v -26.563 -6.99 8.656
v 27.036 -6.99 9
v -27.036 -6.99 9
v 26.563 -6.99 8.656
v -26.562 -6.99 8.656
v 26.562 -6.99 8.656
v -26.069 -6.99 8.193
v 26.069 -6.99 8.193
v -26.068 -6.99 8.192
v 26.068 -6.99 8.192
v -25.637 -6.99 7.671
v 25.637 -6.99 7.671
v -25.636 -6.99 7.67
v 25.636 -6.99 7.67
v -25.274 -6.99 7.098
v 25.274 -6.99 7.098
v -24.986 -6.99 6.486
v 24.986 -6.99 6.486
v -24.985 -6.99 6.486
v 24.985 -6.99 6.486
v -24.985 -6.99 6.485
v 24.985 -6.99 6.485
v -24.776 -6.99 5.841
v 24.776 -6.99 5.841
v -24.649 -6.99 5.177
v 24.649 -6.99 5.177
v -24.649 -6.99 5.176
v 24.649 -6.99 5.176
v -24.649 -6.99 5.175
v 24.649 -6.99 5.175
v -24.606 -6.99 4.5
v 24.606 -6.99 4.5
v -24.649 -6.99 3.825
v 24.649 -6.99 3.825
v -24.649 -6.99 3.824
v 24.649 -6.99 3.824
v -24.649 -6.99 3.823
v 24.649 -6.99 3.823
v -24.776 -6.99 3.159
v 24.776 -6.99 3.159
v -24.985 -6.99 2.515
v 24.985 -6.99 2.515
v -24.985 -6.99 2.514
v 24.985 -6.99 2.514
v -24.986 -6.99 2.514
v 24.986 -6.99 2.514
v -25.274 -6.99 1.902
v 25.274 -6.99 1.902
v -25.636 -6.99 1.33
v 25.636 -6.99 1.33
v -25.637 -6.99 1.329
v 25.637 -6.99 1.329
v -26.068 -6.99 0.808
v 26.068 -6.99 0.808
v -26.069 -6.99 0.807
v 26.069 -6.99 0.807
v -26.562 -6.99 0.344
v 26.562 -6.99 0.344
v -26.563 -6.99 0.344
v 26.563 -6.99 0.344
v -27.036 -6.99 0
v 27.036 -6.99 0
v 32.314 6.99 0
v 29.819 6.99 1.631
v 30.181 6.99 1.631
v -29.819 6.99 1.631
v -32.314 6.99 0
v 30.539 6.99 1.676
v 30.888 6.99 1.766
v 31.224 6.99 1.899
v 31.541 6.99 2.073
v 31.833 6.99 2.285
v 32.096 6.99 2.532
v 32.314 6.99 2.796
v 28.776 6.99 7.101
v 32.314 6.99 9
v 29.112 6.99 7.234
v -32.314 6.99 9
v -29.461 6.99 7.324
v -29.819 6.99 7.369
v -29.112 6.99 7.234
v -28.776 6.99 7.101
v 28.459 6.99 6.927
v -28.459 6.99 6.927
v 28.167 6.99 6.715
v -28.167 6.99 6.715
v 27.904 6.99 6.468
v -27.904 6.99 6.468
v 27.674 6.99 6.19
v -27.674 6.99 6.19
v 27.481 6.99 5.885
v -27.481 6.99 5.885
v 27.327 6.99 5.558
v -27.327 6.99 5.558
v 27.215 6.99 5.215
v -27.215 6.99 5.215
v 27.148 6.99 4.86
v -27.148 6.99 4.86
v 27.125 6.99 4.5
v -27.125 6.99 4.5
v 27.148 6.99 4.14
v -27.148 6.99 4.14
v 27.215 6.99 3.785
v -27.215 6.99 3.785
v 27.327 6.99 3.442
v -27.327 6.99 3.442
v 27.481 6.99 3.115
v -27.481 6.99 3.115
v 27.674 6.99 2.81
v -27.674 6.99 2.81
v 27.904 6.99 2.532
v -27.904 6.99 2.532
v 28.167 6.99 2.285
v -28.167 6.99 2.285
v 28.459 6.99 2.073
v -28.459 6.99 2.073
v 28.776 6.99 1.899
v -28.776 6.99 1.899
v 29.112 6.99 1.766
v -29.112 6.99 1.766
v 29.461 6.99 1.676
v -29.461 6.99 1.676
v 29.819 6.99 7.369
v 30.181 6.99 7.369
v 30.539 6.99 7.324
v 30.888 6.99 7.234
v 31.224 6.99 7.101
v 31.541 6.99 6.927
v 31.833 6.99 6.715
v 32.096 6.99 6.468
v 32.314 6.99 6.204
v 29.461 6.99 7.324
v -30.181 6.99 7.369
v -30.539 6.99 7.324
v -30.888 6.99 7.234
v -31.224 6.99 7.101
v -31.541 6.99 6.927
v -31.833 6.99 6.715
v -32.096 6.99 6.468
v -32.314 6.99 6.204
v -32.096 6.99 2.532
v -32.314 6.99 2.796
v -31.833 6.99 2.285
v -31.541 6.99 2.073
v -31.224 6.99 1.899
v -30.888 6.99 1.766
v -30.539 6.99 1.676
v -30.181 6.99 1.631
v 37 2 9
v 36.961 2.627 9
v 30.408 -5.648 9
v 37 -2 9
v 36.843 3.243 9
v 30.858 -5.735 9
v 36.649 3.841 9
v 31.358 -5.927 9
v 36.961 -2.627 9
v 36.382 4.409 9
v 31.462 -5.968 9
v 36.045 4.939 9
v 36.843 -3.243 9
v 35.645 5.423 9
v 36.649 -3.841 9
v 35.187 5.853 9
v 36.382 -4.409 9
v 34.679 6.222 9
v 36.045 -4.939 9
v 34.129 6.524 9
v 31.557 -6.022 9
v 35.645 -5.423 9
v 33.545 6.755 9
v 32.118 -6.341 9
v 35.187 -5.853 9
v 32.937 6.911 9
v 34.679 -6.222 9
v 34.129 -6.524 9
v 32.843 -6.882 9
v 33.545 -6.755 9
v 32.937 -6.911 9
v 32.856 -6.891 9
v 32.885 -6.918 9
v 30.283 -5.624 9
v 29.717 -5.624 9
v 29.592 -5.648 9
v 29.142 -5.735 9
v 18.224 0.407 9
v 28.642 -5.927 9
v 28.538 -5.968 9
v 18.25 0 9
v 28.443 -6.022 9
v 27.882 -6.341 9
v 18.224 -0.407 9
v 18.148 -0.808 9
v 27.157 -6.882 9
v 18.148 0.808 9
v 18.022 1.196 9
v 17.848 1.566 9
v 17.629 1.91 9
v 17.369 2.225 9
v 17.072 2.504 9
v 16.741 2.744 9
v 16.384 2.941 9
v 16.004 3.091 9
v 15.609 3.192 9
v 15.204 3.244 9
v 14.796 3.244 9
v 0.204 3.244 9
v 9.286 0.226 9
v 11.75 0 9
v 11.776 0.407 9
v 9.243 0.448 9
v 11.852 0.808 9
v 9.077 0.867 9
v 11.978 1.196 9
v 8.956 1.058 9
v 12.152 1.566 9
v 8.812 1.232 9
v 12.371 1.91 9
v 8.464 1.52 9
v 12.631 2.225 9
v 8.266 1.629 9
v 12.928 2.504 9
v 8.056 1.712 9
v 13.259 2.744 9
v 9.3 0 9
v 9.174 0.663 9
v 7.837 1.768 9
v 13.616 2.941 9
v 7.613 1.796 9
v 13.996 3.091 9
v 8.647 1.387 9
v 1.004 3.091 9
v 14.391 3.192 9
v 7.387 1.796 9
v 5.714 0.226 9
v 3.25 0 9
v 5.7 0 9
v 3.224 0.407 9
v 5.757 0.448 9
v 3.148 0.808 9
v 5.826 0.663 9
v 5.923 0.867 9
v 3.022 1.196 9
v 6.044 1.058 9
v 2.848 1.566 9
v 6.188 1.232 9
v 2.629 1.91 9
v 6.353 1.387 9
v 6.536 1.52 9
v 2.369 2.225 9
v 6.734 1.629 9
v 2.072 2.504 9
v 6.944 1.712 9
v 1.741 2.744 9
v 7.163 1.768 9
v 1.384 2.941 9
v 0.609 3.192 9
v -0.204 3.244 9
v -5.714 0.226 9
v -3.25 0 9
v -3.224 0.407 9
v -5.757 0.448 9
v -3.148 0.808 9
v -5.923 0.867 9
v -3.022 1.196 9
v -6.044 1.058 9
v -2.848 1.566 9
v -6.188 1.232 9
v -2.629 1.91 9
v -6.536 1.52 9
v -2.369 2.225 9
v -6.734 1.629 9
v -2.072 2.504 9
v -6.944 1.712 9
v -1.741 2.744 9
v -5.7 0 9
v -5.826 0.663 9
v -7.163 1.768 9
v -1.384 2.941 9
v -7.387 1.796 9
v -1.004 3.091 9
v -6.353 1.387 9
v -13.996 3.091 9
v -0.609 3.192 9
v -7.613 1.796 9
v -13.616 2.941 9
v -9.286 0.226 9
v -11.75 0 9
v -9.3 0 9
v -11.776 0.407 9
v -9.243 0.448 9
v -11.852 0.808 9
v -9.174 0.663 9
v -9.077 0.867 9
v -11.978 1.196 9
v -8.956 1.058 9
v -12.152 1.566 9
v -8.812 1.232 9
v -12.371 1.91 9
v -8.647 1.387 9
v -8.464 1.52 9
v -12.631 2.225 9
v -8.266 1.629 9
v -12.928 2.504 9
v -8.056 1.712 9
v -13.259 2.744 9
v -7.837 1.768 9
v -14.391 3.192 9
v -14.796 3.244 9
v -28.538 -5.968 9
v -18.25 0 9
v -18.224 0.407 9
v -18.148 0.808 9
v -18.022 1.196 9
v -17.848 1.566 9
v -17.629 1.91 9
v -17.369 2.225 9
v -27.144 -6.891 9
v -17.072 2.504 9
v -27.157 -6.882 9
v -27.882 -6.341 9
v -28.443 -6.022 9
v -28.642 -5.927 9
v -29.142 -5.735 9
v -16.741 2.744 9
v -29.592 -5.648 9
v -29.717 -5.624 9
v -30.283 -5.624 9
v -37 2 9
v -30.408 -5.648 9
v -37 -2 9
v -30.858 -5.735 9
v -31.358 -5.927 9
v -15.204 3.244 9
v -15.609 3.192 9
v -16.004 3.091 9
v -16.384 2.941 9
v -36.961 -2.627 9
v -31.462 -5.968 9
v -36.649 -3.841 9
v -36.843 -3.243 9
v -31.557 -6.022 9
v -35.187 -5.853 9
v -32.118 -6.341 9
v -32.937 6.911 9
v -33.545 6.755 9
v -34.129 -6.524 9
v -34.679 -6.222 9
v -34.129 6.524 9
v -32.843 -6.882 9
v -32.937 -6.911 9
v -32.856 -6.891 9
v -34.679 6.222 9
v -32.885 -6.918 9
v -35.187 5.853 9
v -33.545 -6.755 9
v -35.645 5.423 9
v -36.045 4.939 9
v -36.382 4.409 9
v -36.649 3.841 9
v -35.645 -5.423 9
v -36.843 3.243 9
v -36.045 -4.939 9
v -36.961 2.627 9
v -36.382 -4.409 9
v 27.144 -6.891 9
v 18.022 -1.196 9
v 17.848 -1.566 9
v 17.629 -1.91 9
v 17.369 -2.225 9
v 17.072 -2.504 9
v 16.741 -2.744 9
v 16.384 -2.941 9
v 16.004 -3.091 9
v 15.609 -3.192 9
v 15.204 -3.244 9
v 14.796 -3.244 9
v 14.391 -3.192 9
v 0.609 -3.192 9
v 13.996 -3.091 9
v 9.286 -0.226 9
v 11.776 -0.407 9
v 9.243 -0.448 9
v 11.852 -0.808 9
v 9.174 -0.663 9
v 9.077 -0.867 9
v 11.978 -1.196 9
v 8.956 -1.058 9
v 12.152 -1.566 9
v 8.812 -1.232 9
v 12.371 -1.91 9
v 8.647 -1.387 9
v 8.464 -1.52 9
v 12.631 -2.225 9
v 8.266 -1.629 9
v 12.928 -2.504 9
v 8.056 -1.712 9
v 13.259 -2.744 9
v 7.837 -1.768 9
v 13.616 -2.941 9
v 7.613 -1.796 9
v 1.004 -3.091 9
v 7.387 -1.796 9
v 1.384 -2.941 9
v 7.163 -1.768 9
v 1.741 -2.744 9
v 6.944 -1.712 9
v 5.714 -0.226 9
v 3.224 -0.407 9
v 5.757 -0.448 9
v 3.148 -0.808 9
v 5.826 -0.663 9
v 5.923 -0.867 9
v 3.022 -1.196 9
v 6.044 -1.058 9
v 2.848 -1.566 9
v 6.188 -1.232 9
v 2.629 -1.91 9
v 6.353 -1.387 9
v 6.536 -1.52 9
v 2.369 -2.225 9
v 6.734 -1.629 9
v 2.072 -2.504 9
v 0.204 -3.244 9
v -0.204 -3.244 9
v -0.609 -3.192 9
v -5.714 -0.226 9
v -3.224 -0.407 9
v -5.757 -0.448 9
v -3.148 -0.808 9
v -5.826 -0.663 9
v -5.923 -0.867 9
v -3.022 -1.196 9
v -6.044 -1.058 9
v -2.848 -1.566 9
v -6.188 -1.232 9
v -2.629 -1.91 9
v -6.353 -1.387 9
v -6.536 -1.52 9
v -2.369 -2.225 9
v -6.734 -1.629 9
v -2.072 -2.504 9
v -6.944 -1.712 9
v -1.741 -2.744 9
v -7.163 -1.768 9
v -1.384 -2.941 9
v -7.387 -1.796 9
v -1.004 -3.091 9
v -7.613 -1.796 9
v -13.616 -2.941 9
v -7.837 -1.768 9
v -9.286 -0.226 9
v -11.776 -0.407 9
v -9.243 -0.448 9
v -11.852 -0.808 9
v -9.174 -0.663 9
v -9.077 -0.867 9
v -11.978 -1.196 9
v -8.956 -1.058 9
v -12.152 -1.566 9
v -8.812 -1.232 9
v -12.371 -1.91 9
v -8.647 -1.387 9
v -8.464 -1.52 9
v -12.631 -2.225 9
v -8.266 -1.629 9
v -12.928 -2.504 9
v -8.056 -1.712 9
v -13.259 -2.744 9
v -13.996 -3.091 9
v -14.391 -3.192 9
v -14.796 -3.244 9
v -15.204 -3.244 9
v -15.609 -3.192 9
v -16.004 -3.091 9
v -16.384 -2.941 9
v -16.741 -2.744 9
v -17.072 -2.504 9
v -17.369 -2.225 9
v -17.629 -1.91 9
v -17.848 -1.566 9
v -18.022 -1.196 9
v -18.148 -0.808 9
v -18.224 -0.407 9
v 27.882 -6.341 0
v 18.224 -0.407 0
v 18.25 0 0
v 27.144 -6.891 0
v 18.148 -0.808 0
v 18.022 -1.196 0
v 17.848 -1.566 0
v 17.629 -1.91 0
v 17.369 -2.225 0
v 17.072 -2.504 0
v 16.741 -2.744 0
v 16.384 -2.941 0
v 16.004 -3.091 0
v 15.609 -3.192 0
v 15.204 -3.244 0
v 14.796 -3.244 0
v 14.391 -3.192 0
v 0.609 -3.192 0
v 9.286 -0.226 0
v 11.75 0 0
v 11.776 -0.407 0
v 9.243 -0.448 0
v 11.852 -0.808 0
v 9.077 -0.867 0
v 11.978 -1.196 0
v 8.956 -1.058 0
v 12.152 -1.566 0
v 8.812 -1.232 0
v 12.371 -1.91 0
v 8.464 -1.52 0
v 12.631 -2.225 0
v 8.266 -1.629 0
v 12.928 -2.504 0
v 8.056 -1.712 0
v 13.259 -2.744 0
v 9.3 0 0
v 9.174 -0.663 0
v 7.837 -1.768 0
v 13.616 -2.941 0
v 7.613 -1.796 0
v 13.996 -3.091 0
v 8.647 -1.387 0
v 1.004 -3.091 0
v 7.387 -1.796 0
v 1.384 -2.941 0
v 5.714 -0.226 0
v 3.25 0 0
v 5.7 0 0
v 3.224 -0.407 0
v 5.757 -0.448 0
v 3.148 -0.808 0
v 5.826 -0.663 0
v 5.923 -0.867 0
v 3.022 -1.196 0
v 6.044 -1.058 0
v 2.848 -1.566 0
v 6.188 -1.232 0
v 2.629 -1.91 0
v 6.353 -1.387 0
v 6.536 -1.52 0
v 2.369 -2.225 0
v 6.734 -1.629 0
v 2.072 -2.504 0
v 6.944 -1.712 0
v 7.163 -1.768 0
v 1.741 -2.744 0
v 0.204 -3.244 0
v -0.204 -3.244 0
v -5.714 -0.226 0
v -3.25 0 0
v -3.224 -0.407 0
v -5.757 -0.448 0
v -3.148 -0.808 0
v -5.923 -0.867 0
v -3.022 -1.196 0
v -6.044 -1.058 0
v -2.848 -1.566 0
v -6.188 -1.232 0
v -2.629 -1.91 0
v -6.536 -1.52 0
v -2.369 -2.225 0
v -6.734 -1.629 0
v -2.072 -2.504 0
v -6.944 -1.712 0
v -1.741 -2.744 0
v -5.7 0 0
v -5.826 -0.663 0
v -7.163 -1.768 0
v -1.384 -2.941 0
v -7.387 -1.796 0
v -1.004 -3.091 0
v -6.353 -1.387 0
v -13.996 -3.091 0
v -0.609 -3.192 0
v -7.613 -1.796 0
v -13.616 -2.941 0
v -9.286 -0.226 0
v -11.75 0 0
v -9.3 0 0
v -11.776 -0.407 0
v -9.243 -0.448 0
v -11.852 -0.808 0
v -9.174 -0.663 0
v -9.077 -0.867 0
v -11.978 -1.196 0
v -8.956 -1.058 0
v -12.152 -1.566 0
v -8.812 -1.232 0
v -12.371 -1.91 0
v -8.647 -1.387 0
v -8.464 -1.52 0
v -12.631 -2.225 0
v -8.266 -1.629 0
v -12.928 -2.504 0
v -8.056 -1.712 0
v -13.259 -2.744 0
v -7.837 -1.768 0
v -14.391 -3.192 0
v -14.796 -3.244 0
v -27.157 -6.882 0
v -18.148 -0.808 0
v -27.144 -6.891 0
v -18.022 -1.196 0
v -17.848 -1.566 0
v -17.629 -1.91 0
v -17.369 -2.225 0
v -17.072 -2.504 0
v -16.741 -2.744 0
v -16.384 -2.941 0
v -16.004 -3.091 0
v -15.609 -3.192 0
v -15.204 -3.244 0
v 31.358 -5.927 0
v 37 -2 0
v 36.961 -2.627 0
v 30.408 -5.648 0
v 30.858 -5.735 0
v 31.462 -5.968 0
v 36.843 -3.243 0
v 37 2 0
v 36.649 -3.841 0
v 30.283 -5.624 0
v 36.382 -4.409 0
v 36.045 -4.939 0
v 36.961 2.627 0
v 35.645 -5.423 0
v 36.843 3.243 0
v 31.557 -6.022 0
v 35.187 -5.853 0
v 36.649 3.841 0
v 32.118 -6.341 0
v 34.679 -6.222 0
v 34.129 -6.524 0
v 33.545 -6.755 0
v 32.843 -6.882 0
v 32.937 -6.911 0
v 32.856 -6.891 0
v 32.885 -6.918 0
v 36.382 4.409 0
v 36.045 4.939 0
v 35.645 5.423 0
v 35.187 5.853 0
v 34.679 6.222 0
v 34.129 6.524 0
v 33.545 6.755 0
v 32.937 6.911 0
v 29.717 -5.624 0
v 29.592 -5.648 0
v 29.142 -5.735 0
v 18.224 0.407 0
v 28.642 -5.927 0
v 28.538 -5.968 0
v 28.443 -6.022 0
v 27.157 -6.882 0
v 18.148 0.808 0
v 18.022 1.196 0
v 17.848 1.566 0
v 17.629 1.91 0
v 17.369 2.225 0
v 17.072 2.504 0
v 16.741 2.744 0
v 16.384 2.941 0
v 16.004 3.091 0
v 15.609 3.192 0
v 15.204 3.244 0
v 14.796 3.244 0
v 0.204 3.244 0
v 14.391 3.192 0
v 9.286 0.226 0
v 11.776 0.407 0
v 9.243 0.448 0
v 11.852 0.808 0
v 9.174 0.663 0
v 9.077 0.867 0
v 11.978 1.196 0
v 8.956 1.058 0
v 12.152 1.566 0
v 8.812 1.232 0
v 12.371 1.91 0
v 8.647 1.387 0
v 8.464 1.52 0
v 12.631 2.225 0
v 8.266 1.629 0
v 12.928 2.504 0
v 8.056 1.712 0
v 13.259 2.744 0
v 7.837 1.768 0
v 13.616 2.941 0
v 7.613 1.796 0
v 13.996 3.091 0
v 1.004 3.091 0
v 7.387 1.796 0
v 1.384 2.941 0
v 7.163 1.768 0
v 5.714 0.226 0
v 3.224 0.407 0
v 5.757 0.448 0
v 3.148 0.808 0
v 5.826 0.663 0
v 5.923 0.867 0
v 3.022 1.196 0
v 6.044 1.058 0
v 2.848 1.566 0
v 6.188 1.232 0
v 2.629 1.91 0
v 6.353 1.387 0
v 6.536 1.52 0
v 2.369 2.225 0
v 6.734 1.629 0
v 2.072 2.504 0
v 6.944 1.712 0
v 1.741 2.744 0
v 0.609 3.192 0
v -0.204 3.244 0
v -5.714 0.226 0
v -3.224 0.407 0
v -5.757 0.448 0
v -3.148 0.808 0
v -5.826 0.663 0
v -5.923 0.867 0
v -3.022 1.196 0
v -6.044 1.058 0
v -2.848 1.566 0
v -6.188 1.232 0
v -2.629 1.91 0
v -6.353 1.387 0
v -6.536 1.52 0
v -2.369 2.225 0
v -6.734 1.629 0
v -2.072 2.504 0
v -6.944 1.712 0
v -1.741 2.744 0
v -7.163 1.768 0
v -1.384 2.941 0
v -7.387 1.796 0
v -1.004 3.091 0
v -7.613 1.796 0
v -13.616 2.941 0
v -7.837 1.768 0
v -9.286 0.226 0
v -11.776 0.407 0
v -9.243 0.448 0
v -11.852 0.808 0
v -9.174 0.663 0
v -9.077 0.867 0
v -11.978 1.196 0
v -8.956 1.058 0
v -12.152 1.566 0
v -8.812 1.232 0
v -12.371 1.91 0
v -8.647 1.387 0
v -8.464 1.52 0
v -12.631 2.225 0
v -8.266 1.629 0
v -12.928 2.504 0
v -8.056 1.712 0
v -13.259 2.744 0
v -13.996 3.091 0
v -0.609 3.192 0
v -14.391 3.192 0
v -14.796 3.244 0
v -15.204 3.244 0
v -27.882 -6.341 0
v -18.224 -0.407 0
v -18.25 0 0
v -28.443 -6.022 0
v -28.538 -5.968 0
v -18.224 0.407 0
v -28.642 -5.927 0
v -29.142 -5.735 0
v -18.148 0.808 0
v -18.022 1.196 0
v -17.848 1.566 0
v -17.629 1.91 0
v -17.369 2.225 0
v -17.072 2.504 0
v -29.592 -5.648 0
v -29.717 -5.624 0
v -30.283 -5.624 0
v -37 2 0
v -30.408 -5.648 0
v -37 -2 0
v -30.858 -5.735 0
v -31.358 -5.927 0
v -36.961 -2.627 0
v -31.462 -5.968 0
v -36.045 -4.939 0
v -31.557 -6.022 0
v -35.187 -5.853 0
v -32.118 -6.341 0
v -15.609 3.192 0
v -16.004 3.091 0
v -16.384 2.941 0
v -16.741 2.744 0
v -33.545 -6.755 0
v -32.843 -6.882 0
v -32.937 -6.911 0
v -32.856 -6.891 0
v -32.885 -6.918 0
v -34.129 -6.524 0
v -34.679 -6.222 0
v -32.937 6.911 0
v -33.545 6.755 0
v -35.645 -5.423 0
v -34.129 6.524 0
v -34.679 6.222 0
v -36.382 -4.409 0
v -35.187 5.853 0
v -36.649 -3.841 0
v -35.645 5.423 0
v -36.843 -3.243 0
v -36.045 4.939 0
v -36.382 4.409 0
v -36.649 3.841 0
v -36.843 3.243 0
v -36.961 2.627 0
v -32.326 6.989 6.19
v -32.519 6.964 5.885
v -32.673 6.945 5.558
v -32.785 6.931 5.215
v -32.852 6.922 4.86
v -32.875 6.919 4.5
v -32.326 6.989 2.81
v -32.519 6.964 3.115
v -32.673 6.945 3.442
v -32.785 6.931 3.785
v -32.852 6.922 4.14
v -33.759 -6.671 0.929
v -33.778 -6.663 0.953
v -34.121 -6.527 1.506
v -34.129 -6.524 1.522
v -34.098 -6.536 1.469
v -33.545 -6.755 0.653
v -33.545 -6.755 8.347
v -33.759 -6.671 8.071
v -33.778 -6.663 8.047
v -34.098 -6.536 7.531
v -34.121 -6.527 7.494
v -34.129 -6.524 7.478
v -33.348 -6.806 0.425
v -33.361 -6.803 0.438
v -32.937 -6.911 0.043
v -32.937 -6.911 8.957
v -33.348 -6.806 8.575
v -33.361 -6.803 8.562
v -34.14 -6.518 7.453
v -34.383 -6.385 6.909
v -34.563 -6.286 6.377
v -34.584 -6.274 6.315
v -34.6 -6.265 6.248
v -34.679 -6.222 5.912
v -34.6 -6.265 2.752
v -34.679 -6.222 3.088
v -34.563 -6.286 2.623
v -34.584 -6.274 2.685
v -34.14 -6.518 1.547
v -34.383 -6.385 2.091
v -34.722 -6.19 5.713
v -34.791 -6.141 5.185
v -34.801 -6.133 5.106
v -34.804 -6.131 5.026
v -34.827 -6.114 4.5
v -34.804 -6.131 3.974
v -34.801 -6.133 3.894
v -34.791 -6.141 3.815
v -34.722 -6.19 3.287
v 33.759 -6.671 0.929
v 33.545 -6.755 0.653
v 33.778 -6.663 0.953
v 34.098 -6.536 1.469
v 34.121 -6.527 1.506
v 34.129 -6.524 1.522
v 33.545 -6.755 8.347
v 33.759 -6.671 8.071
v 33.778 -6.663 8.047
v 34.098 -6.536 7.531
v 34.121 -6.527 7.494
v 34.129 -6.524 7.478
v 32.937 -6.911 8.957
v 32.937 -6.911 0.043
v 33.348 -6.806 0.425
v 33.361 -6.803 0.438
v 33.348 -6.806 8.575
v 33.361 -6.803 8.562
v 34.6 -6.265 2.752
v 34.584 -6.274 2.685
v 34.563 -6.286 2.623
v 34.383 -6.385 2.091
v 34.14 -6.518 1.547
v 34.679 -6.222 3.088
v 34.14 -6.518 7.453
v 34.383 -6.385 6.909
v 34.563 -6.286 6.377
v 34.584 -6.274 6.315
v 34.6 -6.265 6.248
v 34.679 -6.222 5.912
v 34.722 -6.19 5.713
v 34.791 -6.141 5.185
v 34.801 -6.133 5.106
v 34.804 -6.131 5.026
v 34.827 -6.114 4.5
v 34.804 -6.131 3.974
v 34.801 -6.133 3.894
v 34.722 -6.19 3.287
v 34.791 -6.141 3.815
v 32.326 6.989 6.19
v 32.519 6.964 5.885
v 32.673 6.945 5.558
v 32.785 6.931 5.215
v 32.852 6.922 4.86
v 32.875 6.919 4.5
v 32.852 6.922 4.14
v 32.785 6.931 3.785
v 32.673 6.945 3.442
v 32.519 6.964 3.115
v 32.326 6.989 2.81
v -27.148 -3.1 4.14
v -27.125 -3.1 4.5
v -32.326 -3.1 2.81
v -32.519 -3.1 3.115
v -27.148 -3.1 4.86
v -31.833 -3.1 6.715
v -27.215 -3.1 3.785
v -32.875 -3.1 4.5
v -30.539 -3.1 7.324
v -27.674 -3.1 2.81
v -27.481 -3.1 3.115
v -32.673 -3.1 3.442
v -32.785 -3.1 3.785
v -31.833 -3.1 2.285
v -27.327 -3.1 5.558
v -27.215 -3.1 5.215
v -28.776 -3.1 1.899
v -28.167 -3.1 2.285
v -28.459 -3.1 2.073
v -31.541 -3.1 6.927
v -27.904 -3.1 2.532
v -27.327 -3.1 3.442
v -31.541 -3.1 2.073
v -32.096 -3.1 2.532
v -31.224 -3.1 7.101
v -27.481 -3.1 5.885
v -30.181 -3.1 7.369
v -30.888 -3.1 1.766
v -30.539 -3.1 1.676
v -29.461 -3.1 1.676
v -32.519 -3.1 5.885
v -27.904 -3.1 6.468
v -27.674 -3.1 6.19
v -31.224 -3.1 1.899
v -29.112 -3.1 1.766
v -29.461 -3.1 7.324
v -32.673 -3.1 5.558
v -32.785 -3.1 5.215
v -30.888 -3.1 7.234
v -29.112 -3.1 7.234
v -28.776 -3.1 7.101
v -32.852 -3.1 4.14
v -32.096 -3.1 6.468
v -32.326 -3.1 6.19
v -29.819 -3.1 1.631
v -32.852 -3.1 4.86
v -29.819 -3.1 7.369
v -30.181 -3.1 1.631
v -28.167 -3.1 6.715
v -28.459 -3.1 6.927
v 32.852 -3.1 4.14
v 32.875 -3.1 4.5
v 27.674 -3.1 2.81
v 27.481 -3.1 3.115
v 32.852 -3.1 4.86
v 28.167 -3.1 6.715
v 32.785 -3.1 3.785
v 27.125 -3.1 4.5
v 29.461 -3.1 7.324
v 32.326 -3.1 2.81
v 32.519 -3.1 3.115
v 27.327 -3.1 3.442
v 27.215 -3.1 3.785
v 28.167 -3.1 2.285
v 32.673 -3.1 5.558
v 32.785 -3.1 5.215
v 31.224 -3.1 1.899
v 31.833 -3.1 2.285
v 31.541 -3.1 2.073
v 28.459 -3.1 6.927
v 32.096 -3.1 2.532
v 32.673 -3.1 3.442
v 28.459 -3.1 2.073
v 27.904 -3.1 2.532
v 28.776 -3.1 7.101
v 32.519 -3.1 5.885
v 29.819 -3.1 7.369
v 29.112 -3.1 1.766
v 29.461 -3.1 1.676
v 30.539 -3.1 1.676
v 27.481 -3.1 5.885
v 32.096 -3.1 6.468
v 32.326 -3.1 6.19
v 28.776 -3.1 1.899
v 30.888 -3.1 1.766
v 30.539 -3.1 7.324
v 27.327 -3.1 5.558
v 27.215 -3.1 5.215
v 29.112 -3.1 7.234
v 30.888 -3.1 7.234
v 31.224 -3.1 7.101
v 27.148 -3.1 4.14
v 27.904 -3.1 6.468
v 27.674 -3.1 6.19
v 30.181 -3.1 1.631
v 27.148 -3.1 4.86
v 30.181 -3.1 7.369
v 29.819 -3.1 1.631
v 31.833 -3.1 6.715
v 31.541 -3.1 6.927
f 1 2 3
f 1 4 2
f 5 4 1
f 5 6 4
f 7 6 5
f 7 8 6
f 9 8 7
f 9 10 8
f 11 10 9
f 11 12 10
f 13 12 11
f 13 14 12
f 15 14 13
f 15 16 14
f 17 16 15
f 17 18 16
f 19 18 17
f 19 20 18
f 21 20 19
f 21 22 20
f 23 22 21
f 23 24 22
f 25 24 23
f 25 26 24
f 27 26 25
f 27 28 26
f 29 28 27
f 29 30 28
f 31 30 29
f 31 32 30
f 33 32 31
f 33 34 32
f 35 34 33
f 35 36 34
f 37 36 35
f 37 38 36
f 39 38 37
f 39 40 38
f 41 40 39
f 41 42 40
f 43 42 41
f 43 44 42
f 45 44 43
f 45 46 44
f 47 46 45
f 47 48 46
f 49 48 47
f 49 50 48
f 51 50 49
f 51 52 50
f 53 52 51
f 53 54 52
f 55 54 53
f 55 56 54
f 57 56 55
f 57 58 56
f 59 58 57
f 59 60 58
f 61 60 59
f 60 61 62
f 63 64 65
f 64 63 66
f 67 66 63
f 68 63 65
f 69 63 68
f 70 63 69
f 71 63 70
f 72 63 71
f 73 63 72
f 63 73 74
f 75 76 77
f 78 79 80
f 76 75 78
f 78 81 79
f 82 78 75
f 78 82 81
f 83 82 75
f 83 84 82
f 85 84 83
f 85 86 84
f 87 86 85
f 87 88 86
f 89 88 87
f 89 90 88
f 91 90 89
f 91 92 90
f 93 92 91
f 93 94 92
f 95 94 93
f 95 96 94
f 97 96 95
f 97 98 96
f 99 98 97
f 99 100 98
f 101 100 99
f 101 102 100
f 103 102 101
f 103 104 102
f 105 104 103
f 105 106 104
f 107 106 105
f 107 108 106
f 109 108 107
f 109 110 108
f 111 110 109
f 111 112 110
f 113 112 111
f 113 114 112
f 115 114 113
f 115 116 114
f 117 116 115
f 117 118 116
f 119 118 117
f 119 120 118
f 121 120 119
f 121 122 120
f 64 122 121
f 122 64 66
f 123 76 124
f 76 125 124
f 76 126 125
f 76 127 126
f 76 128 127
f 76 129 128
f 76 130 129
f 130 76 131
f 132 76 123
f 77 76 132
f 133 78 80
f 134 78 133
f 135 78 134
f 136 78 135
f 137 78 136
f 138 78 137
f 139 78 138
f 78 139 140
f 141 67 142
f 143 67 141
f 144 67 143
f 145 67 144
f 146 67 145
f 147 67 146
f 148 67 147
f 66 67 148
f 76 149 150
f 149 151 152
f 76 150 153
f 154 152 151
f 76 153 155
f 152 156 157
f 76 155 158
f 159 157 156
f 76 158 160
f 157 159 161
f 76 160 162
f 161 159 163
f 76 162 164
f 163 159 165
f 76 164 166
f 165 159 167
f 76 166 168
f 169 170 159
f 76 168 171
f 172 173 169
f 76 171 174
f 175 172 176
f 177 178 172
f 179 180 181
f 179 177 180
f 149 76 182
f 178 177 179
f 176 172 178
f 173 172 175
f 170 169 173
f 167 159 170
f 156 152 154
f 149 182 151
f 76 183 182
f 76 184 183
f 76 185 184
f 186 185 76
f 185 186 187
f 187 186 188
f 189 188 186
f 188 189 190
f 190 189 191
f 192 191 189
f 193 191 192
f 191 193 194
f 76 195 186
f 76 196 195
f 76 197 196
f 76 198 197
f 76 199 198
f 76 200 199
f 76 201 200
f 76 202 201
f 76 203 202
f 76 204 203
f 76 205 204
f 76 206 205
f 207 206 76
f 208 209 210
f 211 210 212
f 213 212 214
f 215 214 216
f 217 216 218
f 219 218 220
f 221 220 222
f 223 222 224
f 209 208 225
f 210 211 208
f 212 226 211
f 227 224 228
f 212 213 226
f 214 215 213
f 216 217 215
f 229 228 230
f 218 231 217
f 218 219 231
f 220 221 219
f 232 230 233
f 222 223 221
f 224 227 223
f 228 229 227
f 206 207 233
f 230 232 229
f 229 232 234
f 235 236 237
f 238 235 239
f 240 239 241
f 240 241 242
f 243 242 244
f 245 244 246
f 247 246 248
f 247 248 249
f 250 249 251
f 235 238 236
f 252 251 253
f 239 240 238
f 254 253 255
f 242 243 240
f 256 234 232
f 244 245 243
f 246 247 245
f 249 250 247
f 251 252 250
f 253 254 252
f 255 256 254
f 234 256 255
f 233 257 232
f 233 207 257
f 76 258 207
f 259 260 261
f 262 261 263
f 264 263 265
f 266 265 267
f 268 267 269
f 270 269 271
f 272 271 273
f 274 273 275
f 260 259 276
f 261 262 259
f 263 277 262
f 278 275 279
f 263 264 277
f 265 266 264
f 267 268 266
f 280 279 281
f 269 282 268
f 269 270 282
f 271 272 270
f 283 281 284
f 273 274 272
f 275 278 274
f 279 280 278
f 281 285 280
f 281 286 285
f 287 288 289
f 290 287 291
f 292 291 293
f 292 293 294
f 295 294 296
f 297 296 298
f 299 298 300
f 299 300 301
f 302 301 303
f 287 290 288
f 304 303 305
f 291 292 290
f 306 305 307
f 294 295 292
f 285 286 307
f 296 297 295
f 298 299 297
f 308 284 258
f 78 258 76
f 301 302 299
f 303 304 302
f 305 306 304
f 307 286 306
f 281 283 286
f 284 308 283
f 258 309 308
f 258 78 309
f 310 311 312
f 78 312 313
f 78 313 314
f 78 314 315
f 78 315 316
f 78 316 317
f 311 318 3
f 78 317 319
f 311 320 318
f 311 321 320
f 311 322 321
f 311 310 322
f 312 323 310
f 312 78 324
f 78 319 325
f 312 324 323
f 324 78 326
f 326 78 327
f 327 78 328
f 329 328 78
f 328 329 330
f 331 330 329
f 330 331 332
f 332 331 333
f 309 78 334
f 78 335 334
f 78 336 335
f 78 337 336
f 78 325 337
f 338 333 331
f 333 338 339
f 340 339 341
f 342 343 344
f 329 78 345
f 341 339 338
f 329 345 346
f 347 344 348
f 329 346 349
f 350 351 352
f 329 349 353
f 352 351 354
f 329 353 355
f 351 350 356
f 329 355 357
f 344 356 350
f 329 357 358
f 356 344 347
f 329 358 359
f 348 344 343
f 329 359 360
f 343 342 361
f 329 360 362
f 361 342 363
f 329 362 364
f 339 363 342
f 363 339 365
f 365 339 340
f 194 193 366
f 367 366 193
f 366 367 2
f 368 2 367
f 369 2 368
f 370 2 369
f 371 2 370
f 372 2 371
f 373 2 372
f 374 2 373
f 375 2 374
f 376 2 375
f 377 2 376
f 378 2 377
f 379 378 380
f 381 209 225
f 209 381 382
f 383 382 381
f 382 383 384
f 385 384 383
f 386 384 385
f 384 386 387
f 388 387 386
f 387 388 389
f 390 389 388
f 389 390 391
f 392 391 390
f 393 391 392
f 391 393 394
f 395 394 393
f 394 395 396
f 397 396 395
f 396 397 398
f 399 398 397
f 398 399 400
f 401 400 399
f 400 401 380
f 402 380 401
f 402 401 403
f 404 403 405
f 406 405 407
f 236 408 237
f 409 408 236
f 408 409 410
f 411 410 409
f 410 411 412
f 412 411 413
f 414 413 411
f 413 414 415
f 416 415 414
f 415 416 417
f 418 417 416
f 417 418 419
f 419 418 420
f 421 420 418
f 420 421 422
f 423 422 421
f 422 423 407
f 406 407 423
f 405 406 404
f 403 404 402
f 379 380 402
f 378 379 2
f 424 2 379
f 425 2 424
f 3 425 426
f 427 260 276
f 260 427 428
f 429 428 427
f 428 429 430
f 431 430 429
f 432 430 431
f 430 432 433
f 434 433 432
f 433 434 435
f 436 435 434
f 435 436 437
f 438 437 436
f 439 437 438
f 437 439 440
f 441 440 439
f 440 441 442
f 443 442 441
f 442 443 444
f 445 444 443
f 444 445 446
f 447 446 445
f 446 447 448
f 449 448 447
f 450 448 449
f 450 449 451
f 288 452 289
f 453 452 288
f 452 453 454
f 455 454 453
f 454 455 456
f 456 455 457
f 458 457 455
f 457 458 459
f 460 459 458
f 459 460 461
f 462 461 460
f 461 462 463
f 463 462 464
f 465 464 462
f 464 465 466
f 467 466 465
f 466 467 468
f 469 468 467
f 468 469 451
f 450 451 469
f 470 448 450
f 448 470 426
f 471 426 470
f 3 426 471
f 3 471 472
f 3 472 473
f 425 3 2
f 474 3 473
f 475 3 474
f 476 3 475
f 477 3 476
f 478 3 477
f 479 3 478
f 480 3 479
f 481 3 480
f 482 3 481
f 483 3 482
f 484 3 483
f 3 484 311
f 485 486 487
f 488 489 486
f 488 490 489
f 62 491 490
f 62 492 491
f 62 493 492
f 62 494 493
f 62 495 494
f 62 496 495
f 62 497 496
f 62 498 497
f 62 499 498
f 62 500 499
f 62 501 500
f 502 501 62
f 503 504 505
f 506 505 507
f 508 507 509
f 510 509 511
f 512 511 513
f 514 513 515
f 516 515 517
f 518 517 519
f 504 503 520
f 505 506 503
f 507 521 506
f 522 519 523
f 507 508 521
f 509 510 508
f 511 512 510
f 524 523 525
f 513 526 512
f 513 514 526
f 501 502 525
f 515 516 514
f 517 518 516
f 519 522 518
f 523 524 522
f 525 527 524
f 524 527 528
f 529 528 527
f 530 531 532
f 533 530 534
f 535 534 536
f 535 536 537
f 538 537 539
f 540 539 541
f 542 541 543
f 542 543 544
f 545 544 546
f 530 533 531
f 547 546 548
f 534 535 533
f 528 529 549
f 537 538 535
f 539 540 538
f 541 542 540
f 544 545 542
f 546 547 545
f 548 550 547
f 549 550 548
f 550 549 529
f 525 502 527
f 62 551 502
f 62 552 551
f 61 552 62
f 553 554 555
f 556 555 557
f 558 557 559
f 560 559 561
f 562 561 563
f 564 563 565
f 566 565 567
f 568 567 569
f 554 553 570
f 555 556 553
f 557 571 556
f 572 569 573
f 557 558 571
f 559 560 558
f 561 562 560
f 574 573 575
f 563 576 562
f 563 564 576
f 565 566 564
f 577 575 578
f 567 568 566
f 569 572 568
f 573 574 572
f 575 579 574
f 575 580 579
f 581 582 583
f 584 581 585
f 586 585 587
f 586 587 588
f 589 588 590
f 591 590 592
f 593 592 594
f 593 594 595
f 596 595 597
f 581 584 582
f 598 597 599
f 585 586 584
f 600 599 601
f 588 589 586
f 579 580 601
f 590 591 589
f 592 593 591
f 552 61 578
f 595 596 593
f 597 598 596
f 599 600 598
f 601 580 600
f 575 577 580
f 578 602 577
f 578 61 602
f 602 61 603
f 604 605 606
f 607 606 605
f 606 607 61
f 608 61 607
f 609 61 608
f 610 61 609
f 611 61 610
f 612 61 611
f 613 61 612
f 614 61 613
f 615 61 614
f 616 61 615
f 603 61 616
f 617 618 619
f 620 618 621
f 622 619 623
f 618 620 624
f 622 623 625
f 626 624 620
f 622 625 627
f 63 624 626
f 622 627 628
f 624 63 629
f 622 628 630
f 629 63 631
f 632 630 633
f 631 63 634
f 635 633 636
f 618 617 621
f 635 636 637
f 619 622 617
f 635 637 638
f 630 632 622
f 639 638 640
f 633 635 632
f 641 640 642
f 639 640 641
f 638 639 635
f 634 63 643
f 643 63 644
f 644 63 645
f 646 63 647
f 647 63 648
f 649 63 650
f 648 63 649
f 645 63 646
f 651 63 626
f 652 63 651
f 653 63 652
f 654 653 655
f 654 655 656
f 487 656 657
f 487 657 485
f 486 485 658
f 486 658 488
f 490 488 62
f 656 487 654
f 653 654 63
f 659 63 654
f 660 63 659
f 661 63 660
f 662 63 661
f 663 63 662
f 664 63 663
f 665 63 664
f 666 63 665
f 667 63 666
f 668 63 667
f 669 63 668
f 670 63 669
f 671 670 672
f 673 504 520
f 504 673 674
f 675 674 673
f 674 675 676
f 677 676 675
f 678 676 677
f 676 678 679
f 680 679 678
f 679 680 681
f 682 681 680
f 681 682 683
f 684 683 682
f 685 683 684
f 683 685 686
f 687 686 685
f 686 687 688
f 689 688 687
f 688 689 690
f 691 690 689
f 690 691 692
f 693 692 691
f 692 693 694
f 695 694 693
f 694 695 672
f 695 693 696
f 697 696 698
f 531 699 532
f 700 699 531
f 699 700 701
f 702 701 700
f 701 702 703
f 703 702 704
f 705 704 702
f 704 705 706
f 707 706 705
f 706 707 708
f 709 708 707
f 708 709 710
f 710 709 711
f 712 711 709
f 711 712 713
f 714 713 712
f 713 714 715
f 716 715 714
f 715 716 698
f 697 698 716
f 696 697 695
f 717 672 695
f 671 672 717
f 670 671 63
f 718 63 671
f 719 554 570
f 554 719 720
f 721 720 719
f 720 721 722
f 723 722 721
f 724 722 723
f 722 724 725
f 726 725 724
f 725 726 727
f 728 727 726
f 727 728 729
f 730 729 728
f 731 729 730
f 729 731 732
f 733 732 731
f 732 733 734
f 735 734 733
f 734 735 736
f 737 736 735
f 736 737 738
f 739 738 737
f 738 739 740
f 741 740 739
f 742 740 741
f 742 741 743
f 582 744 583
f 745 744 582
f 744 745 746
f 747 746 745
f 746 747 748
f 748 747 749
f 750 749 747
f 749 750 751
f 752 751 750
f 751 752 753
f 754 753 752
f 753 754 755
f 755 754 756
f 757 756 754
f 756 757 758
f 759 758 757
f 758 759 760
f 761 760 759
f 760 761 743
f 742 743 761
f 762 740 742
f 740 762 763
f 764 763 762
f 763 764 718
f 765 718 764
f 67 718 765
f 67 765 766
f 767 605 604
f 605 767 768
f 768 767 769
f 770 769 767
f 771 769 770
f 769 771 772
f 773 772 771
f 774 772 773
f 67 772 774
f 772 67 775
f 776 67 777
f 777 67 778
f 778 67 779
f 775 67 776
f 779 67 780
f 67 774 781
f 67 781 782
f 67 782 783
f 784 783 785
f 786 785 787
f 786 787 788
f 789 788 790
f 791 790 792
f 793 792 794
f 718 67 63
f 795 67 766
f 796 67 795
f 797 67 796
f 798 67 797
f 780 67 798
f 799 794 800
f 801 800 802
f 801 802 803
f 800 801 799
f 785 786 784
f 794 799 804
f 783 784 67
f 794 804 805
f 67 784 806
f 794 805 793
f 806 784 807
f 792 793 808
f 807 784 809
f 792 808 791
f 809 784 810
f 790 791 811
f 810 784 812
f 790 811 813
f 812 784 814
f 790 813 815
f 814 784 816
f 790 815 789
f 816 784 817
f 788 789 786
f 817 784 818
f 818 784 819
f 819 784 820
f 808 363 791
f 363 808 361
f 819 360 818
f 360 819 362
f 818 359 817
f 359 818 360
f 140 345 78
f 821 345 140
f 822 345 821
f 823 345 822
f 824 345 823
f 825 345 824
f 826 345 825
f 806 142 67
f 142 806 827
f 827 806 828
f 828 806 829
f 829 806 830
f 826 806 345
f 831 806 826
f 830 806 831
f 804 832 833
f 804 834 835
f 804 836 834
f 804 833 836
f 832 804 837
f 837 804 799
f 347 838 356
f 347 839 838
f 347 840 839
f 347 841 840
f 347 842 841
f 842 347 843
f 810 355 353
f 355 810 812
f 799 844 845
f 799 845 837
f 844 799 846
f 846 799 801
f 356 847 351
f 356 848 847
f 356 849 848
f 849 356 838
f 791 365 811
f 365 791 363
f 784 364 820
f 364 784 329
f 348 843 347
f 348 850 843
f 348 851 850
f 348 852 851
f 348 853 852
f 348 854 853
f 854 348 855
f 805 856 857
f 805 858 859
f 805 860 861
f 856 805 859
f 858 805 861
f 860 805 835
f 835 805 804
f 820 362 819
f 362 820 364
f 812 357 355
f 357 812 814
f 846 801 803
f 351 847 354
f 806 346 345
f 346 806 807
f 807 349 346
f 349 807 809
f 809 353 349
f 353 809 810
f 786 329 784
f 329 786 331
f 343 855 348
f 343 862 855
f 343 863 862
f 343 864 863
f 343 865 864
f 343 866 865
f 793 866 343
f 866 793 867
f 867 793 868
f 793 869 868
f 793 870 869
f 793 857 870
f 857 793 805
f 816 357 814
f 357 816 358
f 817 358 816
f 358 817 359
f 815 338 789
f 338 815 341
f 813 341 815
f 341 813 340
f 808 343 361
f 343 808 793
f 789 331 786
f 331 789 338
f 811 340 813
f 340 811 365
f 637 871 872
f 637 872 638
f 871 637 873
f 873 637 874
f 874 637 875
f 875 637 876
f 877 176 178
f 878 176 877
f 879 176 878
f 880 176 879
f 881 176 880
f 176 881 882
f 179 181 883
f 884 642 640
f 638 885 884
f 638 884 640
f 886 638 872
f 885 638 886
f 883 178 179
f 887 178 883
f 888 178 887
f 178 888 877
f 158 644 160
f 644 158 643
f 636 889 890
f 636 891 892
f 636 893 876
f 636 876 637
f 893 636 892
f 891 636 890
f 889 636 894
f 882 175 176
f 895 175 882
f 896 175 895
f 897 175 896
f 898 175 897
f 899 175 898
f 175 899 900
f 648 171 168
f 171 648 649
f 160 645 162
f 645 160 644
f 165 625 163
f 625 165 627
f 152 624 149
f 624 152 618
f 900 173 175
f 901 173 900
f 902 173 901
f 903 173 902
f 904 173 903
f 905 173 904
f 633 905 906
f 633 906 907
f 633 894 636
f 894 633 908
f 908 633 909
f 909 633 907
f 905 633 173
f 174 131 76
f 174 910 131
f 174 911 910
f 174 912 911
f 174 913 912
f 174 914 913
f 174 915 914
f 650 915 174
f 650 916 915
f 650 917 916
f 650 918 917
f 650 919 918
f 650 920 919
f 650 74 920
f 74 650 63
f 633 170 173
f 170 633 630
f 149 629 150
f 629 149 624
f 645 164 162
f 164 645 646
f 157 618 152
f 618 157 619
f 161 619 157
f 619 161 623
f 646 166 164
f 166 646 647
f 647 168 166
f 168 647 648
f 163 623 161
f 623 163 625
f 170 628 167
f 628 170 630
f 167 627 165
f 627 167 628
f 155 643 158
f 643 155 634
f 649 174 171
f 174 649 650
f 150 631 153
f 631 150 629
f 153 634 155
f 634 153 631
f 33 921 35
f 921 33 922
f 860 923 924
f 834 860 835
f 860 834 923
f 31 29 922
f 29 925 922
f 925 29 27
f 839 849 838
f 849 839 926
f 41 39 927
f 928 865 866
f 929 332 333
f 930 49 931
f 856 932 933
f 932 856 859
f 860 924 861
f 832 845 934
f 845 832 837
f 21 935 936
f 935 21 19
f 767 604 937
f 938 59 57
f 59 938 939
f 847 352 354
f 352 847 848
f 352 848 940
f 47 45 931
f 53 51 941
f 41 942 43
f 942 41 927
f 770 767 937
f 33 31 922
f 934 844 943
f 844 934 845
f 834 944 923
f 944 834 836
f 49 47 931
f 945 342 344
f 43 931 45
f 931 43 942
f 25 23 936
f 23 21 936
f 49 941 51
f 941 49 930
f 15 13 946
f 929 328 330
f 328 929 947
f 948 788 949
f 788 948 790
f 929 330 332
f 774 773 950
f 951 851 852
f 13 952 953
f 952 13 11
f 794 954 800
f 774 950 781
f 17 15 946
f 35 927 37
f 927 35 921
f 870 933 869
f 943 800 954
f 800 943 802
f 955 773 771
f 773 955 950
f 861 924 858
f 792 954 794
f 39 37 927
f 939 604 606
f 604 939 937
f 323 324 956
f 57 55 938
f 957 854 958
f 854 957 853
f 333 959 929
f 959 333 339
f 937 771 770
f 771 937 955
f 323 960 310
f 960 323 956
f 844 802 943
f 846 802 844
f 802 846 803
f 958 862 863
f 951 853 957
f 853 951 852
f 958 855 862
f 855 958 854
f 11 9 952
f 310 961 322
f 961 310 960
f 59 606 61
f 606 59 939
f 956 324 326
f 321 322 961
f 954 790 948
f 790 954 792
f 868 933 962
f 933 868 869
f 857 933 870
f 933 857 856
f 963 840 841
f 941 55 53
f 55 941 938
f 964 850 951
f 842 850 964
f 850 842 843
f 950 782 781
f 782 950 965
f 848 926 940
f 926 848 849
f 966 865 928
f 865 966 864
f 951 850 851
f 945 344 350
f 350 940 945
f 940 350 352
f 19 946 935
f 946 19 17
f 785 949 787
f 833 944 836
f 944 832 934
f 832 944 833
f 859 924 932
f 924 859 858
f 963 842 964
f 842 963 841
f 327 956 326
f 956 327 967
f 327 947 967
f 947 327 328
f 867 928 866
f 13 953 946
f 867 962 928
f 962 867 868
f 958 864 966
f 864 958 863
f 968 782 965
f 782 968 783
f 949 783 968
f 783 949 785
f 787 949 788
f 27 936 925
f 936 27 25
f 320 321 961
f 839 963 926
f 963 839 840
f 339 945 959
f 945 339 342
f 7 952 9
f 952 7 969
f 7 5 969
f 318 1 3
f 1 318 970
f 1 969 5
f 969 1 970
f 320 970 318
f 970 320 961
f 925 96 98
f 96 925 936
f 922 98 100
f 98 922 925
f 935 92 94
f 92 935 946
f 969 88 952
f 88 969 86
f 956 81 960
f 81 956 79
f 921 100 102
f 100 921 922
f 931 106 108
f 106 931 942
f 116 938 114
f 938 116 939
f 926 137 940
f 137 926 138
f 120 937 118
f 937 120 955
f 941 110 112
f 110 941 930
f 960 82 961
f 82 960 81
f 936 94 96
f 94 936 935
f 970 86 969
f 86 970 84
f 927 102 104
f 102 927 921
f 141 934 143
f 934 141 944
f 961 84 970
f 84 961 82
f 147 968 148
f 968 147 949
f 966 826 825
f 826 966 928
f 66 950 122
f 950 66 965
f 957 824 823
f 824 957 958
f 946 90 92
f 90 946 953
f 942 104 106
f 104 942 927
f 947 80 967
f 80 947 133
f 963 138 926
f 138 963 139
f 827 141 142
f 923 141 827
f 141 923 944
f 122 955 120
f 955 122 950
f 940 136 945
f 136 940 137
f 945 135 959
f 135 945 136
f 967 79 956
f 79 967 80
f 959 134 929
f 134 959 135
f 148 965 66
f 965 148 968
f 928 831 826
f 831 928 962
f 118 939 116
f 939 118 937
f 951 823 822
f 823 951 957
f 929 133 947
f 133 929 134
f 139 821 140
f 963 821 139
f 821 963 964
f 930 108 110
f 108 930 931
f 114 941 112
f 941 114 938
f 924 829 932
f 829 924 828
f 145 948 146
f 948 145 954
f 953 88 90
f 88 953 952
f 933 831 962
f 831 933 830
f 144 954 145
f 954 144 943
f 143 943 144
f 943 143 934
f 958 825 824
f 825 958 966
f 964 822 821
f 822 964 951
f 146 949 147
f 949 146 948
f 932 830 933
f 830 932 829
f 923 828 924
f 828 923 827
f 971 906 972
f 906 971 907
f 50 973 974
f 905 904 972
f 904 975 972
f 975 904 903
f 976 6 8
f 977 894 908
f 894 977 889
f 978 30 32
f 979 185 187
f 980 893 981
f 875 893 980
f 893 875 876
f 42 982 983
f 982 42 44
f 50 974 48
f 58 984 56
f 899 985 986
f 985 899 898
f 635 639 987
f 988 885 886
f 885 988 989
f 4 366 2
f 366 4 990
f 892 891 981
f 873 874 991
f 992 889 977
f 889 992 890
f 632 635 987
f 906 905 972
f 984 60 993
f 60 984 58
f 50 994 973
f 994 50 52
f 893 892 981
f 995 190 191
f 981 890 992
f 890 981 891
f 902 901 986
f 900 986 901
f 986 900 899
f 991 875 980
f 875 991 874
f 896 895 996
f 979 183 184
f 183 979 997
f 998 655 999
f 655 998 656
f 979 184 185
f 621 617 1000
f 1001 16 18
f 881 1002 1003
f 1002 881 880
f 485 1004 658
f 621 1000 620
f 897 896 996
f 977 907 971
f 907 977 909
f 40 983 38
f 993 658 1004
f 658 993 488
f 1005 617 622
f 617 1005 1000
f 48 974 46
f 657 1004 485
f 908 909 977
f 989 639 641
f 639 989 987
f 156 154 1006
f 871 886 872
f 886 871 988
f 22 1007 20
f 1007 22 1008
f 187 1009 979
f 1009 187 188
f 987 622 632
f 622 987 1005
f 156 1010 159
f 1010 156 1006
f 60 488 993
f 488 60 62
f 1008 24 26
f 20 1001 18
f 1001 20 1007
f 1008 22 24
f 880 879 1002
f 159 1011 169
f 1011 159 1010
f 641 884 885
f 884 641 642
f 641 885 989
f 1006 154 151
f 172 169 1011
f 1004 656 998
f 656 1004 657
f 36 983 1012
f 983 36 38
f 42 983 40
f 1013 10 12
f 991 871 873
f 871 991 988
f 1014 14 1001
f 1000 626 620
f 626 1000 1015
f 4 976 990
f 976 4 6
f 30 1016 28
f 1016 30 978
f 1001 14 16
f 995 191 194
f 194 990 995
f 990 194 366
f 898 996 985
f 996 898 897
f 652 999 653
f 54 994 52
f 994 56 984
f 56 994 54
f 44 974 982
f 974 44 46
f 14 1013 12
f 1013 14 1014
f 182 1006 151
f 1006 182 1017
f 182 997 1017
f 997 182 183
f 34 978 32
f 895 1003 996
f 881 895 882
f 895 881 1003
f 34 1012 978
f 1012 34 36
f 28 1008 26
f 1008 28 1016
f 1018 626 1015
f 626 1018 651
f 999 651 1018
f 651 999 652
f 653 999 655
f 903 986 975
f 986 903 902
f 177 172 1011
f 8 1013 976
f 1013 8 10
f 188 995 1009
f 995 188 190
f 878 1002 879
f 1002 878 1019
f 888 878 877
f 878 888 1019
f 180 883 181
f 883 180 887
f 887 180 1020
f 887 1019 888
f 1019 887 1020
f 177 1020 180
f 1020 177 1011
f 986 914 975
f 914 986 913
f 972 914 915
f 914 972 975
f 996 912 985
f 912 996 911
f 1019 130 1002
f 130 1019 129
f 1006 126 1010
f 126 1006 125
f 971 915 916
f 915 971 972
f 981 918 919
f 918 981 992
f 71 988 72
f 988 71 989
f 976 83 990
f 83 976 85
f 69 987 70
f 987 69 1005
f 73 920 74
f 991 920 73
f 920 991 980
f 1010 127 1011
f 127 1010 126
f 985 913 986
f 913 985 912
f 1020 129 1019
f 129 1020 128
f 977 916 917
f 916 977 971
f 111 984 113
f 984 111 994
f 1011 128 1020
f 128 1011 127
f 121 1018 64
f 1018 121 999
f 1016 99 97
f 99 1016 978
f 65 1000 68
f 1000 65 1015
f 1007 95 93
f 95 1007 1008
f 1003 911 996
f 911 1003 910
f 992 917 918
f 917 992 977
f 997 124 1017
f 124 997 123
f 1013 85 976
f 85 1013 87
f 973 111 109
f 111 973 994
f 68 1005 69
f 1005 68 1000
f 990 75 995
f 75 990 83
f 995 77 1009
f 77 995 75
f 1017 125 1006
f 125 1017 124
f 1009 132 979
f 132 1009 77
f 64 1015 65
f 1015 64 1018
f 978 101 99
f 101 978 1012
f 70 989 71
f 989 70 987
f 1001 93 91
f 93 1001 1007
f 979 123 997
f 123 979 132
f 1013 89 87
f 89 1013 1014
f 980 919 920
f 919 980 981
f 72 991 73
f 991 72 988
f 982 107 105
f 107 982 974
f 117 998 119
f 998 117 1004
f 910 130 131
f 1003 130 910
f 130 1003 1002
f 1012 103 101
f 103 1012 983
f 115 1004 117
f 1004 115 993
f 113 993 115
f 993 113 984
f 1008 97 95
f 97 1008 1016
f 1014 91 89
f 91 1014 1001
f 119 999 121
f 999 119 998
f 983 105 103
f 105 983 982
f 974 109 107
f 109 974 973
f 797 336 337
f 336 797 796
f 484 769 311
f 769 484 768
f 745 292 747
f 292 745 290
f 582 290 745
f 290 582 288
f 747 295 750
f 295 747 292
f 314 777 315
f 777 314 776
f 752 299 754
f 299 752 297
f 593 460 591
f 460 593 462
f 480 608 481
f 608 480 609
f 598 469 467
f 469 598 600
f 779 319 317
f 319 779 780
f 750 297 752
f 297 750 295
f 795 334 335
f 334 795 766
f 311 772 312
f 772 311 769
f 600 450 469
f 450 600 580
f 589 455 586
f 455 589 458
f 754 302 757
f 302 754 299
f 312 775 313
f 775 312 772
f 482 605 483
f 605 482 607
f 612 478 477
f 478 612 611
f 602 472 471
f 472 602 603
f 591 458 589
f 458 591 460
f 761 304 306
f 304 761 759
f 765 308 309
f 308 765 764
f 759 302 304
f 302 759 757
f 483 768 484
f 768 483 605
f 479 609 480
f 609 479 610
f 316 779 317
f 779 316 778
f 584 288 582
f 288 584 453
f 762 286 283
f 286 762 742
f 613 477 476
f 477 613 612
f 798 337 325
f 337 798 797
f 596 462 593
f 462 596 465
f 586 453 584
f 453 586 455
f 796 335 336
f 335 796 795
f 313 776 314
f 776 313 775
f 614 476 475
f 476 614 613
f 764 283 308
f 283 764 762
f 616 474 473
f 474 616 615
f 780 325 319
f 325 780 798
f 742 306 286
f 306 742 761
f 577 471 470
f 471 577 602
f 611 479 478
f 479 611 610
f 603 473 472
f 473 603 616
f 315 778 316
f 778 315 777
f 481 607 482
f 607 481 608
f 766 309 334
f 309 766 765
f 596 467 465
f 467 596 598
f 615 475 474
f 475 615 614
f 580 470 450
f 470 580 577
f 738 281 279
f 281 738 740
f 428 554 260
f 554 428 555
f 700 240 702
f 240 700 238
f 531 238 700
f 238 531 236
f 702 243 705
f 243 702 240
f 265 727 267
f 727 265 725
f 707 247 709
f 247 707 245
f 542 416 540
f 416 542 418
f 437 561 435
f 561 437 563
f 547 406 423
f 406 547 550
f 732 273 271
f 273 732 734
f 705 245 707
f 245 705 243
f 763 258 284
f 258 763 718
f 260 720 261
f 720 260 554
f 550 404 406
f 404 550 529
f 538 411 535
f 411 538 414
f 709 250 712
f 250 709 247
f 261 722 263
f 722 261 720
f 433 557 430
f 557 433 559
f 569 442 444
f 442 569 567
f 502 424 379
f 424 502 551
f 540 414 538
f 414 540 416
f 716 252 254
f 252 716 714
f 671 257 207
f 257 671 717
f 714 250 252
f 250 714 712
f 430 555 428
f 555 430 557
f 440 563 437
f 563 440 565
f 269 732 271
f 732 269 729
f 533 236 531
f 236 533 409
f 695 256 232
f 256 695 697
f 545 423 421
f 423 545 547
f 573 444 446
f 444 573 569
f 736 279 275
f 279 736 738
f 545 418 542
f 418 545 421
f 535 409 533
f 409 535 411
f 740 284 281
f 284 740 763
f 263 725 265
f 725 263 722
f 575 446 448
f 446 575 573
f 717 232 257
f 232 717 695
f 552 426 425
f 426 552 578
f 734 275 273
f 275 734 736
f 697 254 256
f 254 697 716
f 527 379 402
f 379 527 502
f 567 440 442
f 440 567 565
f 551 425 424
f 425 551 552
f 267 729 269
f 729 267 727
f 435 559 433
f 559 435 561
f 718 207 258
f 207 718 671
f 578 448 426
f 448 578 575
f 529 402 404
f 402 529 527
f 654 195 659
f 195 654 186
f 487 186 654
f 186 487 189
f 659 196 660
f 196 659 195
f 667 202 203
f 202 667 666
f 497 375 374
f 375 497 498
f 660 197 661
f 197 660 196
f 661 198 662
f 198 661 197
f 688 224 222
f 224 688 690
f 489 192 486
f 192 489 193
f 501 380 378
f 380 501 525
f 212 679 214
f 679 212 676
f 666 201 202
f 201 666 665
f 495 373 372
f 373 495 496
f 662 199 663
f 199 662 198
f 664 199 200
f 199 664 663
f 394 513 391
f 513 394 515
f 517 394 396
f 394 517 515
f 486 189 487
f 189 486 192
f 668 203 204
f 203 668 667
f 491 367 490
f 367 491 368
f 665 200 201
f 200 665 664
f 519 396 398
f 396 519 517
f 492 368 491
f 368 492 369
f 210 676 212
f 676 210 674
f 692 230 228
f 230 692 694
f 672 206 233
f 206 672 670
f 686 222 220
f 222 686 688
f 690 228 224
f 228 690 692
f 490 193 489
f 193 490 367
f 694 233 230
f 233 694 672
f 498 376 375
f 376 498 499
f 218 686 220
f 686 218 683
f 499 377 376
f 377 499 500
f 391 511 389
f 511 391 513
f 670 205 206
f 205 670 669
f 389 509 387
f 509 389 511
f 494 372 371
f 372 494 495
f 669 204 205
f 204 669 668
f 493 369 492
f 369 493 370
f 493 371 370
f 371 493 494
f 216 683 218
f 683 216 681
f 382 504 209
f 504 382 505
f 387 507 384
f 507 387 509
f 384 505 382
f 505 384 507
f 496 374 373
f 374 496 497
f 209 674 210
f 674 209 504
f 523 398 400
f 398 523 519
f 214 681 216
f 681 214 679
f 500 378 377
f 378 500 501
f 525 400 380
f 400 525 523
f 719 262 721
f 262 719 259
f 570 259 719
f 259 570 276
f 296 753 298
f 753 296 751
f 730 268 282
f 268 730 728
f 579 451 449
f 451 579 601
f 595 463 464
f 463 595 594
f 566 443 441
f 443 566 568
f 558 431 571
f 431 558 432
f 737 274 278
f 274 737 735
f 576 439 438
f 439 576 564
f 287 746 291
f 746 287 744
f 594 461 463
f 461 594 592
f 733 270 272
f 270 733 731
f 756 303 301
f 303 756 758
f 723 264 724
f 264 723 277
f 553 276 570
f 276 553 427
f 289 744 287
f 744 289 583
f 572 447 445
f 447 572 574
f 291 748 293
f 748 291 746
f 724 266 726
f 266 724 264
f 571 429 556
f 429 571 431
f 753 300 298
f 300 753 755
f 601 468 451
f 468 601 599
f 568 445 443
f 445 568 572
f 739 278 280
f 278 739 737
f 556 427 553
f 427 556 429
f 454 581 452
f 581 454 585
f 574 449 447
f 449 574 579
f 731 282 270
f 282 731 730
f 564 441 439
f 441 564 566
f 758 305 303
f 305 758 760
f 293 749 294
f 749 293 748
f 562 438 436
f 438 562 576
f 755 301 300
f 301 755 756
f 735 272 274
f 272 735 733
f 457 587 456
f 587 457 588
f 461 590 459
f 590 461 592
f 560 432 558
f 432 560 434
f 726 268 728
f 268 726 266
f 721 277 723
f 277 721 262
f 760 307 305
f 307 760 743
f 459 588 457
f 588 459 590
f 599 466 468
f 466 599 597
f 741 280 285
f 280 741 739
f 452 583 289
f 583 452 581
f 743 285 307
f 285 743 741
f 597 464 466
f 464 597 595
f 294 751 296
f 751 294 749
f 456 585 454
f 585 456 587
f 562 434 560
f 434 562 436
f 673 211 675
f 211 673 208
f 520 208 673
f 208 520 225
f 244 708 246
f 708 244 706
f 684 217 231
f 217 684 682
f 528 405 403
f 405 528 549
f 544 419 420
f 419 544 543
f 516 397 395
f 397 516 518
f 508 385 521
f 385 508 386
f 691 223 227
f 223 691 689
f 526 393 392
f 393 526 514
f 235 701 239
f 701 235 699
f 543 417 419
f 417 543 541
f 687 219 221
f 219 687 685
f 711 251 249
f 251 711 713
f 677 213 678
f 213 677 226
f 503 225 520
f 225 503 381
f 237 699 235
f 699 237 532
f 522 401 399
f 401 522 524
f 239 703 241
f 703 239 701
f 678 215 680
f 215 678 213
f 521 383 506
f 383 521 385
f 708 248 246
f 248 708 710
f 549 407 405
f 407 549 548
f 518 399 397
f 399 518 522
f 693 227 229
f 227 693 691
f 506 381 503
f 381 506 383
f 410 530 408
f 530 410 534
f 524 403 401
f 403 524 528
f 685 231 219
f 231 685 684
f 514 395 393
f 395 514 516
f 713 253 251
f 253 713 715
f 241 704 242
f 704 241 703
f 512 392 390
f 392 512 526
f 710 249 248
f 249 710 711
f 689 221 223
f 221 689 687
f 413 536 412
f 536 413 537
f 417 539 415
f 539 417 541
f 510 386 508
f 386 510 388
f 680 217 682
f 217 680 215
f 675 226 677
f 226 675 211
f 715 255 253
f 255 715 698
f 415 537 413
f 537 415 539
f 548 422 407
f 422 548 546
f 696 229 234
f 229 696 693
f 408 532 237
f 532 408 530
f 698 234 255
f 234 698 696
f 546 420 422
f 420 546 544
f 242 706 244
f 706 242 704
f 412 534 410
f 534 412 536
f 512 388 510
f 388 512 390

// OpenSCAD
$fn = 50;


difference() {
	union() {
		hull() {
			translate(v = [-17.0000000000, 2.0000000000, 0]) {
				cylinder(h = 9, r = 5);
			}
			translate(v = [17.0000000000, 2.0000000000, 0]) {
				cylinder(h = 9, r = 5);
			}
			translate(v = [-17.0000000000, -2.0000000000, 0]) {
				cylinder(h = 9, r = 5);
			}
			translate(v = [17.0000000000, -2.0000000000, 0]) {
				cylinder(h = 9, r = 5);
			}
		}
		translate(v = [-22.5000000000, 0.0000000000, 0]) {
			hull() {
				translate(v = [-9.5000000000, 2.0000000000, 0]) {
					cylinder(h = 9, r = 5);
				}
				translate(v = [9.5000000000, 2.0000000000, 0]) {
					cylinder(h = 9, r = 5);
				}
				translate(v = [-9.5000000000, -2.0000000000, 0]) {
					cylinder(h = 9, r = 5);
				}
				translate(v = [9.5000000000, -2.0000000000, 0]) {
					cylinder(h = 9, r = 5);
				}
			}
		}
		translate(v = [-22.5000000000, 0.0000000000, 0]) {
			hull() {
				translate(v = [-9.5000000000, 2.0000000000, 0]) {
					cylinder(h = 9, r = 5);
				}
				translate(v = [9.5000000000, 2.0000000000, 0]) {
					cylinder(h = 9, r = 5);
				}
				translate(v = [-9.5000000000, -2.0000000000, 0]) {
					cylinder(h = 9, r = 5);
				}
				translate(v = [9.5000000000, -2.0000000000, 0]) {
					cylinder(h = 9, r = 5);
				}
			}
		}
		translate(v = [22.5000000000, 0.0000000000, 0]) {
			hull() {
				translate(v = [-9.5000000000, 2.0000000000, 0]) {
					cylinder(h = 9, r = 5);
				}
				translate(v = [9.5000000000, 2.0000000000, 0]) {
					cylinder(h = 9, r = 5);
				}
				translate(v = [-9.5000000000, -2.0000000000, 0]) {
					cylinder(h = 9, r = 5);
				}
				translate(v = [9.5000000000, -2.0000000000, 0]) {
					cylinder(h = 9, r = 5);
				}
			}
		}
		translate(v = [22.5000000000, 0.0000000000, 0]) {
			hull() {
				translate(v = [-9.5000000000, 2.0000000000, 0]) {
					cylinder(h = 9, r = 5);
				}
				translate(v = [9.5000000000, 2.0000000000, 0]) {
					cylinder(h = 9, r = 5);
				}
				translate(v = [-9.5000000000, -2.0000000000, 0]) {
					cylinder(h = 9, r = 5);
				}
				translate(v = [9.5000000000, -2.0000000000, 0]) {
					cylinder(h = 9, r = 5);
				}
			}
		}
	}
	union() {
		translate(v = [-30.0000000000, -7.0000000000, 4.5000000000]) {
			rotate(a = [90, 0, 0]) {
				difference() {
					union() {
						#translate(v = [0, 0, -14.0000000000]) {
							cylinder(h = 14, r = 2.6000000000);
						}
						#translate(v = [0, 0, -3.9000000000]) {
							cylinder(h = 3.9000000000, r1 = 2.8750000000, r2 = 5.4000000000);
						}
						#translate(v = [0, 0, -14.0000000000]) {
							cylinder(h = 14, r = 2.8750000000);
						}
						#translate(v = [0, 0, -14.0000000000]) {
							cylinder(h = 14, r = 2.6000000000);
						}
					}
					union();
				}
			}
		}
		translate(v = [30.0000000000, -7.0000000000, 4.5000000000]) {
			rotate(a = [90, 0, 0]) {
				difference() {
					union() {
						#translate(v = [0, 0, -14.0000000000]) {
							cylinder(h = 14, r = 2.6000000000);
						}
						#translate(v = [0, 0, -3.9000000000]) {
							cylinder(h = 3.9000000000, r1 = 2.8750000000, r2 = 5.4000000000);
						}
						#translate(v = [0, 0, -14.0000000000]) {
							cylinder(h = 14, r = 2.8750000000);
						}
						#translate(v = [0, 0, -14.0000000000]) {
							cylinder(h = 14, r = 2.6000000000);
						}
					}
					union();
				}
			}
		}
		translate(v = [-15.0000000000, 0.0000000000, 0]) {
			translate(v = [0, 0, -100]) {
				cylinder(h = 200, r = 3.2500000000);
			}
		}
		translate(v = [0, 0, -100]) {
			cylinder(h = 200, r = 3.2500000000);
		}
		translate(v = [15.0000000000, 0.0000000000, 0]) {
			translate(v = [0, 0, -100]) {
				cylinder(h = 200, r = 3.2500000000);
			}
		}
		translate(v = [-15.0000000000, 0.0000000000, 0]) {
			translate(v = [0, 0, -100]) {
				cylinder(h = 200, r = 1.8000000000);
			}
		}
		translate(v = [-7.5000000000, 0.0000000000, 0]) {
			translate(v = [0, 0, -100]) {
				cylinder(h = 200, r = 1.8000000000);
			}
		}
		translate(v = [0, 0, -100]) {
			cylinder(h = 200, r = 1.8000000000);
		}
		translate(v = [7.5000000000, 0.0000000000, 0]) {
			translate(v = [0, 0, -100]) {
				cylinder(h = 200, r = 1.8000000000);
			}
		}
		translate(v = [15.0000000000, 0.0000000000, 0]) {
			translate(v = [0, 0, -100]) {
				cylinder(h = 200, r = 1.8000000000);
			}
		}
	}
}
